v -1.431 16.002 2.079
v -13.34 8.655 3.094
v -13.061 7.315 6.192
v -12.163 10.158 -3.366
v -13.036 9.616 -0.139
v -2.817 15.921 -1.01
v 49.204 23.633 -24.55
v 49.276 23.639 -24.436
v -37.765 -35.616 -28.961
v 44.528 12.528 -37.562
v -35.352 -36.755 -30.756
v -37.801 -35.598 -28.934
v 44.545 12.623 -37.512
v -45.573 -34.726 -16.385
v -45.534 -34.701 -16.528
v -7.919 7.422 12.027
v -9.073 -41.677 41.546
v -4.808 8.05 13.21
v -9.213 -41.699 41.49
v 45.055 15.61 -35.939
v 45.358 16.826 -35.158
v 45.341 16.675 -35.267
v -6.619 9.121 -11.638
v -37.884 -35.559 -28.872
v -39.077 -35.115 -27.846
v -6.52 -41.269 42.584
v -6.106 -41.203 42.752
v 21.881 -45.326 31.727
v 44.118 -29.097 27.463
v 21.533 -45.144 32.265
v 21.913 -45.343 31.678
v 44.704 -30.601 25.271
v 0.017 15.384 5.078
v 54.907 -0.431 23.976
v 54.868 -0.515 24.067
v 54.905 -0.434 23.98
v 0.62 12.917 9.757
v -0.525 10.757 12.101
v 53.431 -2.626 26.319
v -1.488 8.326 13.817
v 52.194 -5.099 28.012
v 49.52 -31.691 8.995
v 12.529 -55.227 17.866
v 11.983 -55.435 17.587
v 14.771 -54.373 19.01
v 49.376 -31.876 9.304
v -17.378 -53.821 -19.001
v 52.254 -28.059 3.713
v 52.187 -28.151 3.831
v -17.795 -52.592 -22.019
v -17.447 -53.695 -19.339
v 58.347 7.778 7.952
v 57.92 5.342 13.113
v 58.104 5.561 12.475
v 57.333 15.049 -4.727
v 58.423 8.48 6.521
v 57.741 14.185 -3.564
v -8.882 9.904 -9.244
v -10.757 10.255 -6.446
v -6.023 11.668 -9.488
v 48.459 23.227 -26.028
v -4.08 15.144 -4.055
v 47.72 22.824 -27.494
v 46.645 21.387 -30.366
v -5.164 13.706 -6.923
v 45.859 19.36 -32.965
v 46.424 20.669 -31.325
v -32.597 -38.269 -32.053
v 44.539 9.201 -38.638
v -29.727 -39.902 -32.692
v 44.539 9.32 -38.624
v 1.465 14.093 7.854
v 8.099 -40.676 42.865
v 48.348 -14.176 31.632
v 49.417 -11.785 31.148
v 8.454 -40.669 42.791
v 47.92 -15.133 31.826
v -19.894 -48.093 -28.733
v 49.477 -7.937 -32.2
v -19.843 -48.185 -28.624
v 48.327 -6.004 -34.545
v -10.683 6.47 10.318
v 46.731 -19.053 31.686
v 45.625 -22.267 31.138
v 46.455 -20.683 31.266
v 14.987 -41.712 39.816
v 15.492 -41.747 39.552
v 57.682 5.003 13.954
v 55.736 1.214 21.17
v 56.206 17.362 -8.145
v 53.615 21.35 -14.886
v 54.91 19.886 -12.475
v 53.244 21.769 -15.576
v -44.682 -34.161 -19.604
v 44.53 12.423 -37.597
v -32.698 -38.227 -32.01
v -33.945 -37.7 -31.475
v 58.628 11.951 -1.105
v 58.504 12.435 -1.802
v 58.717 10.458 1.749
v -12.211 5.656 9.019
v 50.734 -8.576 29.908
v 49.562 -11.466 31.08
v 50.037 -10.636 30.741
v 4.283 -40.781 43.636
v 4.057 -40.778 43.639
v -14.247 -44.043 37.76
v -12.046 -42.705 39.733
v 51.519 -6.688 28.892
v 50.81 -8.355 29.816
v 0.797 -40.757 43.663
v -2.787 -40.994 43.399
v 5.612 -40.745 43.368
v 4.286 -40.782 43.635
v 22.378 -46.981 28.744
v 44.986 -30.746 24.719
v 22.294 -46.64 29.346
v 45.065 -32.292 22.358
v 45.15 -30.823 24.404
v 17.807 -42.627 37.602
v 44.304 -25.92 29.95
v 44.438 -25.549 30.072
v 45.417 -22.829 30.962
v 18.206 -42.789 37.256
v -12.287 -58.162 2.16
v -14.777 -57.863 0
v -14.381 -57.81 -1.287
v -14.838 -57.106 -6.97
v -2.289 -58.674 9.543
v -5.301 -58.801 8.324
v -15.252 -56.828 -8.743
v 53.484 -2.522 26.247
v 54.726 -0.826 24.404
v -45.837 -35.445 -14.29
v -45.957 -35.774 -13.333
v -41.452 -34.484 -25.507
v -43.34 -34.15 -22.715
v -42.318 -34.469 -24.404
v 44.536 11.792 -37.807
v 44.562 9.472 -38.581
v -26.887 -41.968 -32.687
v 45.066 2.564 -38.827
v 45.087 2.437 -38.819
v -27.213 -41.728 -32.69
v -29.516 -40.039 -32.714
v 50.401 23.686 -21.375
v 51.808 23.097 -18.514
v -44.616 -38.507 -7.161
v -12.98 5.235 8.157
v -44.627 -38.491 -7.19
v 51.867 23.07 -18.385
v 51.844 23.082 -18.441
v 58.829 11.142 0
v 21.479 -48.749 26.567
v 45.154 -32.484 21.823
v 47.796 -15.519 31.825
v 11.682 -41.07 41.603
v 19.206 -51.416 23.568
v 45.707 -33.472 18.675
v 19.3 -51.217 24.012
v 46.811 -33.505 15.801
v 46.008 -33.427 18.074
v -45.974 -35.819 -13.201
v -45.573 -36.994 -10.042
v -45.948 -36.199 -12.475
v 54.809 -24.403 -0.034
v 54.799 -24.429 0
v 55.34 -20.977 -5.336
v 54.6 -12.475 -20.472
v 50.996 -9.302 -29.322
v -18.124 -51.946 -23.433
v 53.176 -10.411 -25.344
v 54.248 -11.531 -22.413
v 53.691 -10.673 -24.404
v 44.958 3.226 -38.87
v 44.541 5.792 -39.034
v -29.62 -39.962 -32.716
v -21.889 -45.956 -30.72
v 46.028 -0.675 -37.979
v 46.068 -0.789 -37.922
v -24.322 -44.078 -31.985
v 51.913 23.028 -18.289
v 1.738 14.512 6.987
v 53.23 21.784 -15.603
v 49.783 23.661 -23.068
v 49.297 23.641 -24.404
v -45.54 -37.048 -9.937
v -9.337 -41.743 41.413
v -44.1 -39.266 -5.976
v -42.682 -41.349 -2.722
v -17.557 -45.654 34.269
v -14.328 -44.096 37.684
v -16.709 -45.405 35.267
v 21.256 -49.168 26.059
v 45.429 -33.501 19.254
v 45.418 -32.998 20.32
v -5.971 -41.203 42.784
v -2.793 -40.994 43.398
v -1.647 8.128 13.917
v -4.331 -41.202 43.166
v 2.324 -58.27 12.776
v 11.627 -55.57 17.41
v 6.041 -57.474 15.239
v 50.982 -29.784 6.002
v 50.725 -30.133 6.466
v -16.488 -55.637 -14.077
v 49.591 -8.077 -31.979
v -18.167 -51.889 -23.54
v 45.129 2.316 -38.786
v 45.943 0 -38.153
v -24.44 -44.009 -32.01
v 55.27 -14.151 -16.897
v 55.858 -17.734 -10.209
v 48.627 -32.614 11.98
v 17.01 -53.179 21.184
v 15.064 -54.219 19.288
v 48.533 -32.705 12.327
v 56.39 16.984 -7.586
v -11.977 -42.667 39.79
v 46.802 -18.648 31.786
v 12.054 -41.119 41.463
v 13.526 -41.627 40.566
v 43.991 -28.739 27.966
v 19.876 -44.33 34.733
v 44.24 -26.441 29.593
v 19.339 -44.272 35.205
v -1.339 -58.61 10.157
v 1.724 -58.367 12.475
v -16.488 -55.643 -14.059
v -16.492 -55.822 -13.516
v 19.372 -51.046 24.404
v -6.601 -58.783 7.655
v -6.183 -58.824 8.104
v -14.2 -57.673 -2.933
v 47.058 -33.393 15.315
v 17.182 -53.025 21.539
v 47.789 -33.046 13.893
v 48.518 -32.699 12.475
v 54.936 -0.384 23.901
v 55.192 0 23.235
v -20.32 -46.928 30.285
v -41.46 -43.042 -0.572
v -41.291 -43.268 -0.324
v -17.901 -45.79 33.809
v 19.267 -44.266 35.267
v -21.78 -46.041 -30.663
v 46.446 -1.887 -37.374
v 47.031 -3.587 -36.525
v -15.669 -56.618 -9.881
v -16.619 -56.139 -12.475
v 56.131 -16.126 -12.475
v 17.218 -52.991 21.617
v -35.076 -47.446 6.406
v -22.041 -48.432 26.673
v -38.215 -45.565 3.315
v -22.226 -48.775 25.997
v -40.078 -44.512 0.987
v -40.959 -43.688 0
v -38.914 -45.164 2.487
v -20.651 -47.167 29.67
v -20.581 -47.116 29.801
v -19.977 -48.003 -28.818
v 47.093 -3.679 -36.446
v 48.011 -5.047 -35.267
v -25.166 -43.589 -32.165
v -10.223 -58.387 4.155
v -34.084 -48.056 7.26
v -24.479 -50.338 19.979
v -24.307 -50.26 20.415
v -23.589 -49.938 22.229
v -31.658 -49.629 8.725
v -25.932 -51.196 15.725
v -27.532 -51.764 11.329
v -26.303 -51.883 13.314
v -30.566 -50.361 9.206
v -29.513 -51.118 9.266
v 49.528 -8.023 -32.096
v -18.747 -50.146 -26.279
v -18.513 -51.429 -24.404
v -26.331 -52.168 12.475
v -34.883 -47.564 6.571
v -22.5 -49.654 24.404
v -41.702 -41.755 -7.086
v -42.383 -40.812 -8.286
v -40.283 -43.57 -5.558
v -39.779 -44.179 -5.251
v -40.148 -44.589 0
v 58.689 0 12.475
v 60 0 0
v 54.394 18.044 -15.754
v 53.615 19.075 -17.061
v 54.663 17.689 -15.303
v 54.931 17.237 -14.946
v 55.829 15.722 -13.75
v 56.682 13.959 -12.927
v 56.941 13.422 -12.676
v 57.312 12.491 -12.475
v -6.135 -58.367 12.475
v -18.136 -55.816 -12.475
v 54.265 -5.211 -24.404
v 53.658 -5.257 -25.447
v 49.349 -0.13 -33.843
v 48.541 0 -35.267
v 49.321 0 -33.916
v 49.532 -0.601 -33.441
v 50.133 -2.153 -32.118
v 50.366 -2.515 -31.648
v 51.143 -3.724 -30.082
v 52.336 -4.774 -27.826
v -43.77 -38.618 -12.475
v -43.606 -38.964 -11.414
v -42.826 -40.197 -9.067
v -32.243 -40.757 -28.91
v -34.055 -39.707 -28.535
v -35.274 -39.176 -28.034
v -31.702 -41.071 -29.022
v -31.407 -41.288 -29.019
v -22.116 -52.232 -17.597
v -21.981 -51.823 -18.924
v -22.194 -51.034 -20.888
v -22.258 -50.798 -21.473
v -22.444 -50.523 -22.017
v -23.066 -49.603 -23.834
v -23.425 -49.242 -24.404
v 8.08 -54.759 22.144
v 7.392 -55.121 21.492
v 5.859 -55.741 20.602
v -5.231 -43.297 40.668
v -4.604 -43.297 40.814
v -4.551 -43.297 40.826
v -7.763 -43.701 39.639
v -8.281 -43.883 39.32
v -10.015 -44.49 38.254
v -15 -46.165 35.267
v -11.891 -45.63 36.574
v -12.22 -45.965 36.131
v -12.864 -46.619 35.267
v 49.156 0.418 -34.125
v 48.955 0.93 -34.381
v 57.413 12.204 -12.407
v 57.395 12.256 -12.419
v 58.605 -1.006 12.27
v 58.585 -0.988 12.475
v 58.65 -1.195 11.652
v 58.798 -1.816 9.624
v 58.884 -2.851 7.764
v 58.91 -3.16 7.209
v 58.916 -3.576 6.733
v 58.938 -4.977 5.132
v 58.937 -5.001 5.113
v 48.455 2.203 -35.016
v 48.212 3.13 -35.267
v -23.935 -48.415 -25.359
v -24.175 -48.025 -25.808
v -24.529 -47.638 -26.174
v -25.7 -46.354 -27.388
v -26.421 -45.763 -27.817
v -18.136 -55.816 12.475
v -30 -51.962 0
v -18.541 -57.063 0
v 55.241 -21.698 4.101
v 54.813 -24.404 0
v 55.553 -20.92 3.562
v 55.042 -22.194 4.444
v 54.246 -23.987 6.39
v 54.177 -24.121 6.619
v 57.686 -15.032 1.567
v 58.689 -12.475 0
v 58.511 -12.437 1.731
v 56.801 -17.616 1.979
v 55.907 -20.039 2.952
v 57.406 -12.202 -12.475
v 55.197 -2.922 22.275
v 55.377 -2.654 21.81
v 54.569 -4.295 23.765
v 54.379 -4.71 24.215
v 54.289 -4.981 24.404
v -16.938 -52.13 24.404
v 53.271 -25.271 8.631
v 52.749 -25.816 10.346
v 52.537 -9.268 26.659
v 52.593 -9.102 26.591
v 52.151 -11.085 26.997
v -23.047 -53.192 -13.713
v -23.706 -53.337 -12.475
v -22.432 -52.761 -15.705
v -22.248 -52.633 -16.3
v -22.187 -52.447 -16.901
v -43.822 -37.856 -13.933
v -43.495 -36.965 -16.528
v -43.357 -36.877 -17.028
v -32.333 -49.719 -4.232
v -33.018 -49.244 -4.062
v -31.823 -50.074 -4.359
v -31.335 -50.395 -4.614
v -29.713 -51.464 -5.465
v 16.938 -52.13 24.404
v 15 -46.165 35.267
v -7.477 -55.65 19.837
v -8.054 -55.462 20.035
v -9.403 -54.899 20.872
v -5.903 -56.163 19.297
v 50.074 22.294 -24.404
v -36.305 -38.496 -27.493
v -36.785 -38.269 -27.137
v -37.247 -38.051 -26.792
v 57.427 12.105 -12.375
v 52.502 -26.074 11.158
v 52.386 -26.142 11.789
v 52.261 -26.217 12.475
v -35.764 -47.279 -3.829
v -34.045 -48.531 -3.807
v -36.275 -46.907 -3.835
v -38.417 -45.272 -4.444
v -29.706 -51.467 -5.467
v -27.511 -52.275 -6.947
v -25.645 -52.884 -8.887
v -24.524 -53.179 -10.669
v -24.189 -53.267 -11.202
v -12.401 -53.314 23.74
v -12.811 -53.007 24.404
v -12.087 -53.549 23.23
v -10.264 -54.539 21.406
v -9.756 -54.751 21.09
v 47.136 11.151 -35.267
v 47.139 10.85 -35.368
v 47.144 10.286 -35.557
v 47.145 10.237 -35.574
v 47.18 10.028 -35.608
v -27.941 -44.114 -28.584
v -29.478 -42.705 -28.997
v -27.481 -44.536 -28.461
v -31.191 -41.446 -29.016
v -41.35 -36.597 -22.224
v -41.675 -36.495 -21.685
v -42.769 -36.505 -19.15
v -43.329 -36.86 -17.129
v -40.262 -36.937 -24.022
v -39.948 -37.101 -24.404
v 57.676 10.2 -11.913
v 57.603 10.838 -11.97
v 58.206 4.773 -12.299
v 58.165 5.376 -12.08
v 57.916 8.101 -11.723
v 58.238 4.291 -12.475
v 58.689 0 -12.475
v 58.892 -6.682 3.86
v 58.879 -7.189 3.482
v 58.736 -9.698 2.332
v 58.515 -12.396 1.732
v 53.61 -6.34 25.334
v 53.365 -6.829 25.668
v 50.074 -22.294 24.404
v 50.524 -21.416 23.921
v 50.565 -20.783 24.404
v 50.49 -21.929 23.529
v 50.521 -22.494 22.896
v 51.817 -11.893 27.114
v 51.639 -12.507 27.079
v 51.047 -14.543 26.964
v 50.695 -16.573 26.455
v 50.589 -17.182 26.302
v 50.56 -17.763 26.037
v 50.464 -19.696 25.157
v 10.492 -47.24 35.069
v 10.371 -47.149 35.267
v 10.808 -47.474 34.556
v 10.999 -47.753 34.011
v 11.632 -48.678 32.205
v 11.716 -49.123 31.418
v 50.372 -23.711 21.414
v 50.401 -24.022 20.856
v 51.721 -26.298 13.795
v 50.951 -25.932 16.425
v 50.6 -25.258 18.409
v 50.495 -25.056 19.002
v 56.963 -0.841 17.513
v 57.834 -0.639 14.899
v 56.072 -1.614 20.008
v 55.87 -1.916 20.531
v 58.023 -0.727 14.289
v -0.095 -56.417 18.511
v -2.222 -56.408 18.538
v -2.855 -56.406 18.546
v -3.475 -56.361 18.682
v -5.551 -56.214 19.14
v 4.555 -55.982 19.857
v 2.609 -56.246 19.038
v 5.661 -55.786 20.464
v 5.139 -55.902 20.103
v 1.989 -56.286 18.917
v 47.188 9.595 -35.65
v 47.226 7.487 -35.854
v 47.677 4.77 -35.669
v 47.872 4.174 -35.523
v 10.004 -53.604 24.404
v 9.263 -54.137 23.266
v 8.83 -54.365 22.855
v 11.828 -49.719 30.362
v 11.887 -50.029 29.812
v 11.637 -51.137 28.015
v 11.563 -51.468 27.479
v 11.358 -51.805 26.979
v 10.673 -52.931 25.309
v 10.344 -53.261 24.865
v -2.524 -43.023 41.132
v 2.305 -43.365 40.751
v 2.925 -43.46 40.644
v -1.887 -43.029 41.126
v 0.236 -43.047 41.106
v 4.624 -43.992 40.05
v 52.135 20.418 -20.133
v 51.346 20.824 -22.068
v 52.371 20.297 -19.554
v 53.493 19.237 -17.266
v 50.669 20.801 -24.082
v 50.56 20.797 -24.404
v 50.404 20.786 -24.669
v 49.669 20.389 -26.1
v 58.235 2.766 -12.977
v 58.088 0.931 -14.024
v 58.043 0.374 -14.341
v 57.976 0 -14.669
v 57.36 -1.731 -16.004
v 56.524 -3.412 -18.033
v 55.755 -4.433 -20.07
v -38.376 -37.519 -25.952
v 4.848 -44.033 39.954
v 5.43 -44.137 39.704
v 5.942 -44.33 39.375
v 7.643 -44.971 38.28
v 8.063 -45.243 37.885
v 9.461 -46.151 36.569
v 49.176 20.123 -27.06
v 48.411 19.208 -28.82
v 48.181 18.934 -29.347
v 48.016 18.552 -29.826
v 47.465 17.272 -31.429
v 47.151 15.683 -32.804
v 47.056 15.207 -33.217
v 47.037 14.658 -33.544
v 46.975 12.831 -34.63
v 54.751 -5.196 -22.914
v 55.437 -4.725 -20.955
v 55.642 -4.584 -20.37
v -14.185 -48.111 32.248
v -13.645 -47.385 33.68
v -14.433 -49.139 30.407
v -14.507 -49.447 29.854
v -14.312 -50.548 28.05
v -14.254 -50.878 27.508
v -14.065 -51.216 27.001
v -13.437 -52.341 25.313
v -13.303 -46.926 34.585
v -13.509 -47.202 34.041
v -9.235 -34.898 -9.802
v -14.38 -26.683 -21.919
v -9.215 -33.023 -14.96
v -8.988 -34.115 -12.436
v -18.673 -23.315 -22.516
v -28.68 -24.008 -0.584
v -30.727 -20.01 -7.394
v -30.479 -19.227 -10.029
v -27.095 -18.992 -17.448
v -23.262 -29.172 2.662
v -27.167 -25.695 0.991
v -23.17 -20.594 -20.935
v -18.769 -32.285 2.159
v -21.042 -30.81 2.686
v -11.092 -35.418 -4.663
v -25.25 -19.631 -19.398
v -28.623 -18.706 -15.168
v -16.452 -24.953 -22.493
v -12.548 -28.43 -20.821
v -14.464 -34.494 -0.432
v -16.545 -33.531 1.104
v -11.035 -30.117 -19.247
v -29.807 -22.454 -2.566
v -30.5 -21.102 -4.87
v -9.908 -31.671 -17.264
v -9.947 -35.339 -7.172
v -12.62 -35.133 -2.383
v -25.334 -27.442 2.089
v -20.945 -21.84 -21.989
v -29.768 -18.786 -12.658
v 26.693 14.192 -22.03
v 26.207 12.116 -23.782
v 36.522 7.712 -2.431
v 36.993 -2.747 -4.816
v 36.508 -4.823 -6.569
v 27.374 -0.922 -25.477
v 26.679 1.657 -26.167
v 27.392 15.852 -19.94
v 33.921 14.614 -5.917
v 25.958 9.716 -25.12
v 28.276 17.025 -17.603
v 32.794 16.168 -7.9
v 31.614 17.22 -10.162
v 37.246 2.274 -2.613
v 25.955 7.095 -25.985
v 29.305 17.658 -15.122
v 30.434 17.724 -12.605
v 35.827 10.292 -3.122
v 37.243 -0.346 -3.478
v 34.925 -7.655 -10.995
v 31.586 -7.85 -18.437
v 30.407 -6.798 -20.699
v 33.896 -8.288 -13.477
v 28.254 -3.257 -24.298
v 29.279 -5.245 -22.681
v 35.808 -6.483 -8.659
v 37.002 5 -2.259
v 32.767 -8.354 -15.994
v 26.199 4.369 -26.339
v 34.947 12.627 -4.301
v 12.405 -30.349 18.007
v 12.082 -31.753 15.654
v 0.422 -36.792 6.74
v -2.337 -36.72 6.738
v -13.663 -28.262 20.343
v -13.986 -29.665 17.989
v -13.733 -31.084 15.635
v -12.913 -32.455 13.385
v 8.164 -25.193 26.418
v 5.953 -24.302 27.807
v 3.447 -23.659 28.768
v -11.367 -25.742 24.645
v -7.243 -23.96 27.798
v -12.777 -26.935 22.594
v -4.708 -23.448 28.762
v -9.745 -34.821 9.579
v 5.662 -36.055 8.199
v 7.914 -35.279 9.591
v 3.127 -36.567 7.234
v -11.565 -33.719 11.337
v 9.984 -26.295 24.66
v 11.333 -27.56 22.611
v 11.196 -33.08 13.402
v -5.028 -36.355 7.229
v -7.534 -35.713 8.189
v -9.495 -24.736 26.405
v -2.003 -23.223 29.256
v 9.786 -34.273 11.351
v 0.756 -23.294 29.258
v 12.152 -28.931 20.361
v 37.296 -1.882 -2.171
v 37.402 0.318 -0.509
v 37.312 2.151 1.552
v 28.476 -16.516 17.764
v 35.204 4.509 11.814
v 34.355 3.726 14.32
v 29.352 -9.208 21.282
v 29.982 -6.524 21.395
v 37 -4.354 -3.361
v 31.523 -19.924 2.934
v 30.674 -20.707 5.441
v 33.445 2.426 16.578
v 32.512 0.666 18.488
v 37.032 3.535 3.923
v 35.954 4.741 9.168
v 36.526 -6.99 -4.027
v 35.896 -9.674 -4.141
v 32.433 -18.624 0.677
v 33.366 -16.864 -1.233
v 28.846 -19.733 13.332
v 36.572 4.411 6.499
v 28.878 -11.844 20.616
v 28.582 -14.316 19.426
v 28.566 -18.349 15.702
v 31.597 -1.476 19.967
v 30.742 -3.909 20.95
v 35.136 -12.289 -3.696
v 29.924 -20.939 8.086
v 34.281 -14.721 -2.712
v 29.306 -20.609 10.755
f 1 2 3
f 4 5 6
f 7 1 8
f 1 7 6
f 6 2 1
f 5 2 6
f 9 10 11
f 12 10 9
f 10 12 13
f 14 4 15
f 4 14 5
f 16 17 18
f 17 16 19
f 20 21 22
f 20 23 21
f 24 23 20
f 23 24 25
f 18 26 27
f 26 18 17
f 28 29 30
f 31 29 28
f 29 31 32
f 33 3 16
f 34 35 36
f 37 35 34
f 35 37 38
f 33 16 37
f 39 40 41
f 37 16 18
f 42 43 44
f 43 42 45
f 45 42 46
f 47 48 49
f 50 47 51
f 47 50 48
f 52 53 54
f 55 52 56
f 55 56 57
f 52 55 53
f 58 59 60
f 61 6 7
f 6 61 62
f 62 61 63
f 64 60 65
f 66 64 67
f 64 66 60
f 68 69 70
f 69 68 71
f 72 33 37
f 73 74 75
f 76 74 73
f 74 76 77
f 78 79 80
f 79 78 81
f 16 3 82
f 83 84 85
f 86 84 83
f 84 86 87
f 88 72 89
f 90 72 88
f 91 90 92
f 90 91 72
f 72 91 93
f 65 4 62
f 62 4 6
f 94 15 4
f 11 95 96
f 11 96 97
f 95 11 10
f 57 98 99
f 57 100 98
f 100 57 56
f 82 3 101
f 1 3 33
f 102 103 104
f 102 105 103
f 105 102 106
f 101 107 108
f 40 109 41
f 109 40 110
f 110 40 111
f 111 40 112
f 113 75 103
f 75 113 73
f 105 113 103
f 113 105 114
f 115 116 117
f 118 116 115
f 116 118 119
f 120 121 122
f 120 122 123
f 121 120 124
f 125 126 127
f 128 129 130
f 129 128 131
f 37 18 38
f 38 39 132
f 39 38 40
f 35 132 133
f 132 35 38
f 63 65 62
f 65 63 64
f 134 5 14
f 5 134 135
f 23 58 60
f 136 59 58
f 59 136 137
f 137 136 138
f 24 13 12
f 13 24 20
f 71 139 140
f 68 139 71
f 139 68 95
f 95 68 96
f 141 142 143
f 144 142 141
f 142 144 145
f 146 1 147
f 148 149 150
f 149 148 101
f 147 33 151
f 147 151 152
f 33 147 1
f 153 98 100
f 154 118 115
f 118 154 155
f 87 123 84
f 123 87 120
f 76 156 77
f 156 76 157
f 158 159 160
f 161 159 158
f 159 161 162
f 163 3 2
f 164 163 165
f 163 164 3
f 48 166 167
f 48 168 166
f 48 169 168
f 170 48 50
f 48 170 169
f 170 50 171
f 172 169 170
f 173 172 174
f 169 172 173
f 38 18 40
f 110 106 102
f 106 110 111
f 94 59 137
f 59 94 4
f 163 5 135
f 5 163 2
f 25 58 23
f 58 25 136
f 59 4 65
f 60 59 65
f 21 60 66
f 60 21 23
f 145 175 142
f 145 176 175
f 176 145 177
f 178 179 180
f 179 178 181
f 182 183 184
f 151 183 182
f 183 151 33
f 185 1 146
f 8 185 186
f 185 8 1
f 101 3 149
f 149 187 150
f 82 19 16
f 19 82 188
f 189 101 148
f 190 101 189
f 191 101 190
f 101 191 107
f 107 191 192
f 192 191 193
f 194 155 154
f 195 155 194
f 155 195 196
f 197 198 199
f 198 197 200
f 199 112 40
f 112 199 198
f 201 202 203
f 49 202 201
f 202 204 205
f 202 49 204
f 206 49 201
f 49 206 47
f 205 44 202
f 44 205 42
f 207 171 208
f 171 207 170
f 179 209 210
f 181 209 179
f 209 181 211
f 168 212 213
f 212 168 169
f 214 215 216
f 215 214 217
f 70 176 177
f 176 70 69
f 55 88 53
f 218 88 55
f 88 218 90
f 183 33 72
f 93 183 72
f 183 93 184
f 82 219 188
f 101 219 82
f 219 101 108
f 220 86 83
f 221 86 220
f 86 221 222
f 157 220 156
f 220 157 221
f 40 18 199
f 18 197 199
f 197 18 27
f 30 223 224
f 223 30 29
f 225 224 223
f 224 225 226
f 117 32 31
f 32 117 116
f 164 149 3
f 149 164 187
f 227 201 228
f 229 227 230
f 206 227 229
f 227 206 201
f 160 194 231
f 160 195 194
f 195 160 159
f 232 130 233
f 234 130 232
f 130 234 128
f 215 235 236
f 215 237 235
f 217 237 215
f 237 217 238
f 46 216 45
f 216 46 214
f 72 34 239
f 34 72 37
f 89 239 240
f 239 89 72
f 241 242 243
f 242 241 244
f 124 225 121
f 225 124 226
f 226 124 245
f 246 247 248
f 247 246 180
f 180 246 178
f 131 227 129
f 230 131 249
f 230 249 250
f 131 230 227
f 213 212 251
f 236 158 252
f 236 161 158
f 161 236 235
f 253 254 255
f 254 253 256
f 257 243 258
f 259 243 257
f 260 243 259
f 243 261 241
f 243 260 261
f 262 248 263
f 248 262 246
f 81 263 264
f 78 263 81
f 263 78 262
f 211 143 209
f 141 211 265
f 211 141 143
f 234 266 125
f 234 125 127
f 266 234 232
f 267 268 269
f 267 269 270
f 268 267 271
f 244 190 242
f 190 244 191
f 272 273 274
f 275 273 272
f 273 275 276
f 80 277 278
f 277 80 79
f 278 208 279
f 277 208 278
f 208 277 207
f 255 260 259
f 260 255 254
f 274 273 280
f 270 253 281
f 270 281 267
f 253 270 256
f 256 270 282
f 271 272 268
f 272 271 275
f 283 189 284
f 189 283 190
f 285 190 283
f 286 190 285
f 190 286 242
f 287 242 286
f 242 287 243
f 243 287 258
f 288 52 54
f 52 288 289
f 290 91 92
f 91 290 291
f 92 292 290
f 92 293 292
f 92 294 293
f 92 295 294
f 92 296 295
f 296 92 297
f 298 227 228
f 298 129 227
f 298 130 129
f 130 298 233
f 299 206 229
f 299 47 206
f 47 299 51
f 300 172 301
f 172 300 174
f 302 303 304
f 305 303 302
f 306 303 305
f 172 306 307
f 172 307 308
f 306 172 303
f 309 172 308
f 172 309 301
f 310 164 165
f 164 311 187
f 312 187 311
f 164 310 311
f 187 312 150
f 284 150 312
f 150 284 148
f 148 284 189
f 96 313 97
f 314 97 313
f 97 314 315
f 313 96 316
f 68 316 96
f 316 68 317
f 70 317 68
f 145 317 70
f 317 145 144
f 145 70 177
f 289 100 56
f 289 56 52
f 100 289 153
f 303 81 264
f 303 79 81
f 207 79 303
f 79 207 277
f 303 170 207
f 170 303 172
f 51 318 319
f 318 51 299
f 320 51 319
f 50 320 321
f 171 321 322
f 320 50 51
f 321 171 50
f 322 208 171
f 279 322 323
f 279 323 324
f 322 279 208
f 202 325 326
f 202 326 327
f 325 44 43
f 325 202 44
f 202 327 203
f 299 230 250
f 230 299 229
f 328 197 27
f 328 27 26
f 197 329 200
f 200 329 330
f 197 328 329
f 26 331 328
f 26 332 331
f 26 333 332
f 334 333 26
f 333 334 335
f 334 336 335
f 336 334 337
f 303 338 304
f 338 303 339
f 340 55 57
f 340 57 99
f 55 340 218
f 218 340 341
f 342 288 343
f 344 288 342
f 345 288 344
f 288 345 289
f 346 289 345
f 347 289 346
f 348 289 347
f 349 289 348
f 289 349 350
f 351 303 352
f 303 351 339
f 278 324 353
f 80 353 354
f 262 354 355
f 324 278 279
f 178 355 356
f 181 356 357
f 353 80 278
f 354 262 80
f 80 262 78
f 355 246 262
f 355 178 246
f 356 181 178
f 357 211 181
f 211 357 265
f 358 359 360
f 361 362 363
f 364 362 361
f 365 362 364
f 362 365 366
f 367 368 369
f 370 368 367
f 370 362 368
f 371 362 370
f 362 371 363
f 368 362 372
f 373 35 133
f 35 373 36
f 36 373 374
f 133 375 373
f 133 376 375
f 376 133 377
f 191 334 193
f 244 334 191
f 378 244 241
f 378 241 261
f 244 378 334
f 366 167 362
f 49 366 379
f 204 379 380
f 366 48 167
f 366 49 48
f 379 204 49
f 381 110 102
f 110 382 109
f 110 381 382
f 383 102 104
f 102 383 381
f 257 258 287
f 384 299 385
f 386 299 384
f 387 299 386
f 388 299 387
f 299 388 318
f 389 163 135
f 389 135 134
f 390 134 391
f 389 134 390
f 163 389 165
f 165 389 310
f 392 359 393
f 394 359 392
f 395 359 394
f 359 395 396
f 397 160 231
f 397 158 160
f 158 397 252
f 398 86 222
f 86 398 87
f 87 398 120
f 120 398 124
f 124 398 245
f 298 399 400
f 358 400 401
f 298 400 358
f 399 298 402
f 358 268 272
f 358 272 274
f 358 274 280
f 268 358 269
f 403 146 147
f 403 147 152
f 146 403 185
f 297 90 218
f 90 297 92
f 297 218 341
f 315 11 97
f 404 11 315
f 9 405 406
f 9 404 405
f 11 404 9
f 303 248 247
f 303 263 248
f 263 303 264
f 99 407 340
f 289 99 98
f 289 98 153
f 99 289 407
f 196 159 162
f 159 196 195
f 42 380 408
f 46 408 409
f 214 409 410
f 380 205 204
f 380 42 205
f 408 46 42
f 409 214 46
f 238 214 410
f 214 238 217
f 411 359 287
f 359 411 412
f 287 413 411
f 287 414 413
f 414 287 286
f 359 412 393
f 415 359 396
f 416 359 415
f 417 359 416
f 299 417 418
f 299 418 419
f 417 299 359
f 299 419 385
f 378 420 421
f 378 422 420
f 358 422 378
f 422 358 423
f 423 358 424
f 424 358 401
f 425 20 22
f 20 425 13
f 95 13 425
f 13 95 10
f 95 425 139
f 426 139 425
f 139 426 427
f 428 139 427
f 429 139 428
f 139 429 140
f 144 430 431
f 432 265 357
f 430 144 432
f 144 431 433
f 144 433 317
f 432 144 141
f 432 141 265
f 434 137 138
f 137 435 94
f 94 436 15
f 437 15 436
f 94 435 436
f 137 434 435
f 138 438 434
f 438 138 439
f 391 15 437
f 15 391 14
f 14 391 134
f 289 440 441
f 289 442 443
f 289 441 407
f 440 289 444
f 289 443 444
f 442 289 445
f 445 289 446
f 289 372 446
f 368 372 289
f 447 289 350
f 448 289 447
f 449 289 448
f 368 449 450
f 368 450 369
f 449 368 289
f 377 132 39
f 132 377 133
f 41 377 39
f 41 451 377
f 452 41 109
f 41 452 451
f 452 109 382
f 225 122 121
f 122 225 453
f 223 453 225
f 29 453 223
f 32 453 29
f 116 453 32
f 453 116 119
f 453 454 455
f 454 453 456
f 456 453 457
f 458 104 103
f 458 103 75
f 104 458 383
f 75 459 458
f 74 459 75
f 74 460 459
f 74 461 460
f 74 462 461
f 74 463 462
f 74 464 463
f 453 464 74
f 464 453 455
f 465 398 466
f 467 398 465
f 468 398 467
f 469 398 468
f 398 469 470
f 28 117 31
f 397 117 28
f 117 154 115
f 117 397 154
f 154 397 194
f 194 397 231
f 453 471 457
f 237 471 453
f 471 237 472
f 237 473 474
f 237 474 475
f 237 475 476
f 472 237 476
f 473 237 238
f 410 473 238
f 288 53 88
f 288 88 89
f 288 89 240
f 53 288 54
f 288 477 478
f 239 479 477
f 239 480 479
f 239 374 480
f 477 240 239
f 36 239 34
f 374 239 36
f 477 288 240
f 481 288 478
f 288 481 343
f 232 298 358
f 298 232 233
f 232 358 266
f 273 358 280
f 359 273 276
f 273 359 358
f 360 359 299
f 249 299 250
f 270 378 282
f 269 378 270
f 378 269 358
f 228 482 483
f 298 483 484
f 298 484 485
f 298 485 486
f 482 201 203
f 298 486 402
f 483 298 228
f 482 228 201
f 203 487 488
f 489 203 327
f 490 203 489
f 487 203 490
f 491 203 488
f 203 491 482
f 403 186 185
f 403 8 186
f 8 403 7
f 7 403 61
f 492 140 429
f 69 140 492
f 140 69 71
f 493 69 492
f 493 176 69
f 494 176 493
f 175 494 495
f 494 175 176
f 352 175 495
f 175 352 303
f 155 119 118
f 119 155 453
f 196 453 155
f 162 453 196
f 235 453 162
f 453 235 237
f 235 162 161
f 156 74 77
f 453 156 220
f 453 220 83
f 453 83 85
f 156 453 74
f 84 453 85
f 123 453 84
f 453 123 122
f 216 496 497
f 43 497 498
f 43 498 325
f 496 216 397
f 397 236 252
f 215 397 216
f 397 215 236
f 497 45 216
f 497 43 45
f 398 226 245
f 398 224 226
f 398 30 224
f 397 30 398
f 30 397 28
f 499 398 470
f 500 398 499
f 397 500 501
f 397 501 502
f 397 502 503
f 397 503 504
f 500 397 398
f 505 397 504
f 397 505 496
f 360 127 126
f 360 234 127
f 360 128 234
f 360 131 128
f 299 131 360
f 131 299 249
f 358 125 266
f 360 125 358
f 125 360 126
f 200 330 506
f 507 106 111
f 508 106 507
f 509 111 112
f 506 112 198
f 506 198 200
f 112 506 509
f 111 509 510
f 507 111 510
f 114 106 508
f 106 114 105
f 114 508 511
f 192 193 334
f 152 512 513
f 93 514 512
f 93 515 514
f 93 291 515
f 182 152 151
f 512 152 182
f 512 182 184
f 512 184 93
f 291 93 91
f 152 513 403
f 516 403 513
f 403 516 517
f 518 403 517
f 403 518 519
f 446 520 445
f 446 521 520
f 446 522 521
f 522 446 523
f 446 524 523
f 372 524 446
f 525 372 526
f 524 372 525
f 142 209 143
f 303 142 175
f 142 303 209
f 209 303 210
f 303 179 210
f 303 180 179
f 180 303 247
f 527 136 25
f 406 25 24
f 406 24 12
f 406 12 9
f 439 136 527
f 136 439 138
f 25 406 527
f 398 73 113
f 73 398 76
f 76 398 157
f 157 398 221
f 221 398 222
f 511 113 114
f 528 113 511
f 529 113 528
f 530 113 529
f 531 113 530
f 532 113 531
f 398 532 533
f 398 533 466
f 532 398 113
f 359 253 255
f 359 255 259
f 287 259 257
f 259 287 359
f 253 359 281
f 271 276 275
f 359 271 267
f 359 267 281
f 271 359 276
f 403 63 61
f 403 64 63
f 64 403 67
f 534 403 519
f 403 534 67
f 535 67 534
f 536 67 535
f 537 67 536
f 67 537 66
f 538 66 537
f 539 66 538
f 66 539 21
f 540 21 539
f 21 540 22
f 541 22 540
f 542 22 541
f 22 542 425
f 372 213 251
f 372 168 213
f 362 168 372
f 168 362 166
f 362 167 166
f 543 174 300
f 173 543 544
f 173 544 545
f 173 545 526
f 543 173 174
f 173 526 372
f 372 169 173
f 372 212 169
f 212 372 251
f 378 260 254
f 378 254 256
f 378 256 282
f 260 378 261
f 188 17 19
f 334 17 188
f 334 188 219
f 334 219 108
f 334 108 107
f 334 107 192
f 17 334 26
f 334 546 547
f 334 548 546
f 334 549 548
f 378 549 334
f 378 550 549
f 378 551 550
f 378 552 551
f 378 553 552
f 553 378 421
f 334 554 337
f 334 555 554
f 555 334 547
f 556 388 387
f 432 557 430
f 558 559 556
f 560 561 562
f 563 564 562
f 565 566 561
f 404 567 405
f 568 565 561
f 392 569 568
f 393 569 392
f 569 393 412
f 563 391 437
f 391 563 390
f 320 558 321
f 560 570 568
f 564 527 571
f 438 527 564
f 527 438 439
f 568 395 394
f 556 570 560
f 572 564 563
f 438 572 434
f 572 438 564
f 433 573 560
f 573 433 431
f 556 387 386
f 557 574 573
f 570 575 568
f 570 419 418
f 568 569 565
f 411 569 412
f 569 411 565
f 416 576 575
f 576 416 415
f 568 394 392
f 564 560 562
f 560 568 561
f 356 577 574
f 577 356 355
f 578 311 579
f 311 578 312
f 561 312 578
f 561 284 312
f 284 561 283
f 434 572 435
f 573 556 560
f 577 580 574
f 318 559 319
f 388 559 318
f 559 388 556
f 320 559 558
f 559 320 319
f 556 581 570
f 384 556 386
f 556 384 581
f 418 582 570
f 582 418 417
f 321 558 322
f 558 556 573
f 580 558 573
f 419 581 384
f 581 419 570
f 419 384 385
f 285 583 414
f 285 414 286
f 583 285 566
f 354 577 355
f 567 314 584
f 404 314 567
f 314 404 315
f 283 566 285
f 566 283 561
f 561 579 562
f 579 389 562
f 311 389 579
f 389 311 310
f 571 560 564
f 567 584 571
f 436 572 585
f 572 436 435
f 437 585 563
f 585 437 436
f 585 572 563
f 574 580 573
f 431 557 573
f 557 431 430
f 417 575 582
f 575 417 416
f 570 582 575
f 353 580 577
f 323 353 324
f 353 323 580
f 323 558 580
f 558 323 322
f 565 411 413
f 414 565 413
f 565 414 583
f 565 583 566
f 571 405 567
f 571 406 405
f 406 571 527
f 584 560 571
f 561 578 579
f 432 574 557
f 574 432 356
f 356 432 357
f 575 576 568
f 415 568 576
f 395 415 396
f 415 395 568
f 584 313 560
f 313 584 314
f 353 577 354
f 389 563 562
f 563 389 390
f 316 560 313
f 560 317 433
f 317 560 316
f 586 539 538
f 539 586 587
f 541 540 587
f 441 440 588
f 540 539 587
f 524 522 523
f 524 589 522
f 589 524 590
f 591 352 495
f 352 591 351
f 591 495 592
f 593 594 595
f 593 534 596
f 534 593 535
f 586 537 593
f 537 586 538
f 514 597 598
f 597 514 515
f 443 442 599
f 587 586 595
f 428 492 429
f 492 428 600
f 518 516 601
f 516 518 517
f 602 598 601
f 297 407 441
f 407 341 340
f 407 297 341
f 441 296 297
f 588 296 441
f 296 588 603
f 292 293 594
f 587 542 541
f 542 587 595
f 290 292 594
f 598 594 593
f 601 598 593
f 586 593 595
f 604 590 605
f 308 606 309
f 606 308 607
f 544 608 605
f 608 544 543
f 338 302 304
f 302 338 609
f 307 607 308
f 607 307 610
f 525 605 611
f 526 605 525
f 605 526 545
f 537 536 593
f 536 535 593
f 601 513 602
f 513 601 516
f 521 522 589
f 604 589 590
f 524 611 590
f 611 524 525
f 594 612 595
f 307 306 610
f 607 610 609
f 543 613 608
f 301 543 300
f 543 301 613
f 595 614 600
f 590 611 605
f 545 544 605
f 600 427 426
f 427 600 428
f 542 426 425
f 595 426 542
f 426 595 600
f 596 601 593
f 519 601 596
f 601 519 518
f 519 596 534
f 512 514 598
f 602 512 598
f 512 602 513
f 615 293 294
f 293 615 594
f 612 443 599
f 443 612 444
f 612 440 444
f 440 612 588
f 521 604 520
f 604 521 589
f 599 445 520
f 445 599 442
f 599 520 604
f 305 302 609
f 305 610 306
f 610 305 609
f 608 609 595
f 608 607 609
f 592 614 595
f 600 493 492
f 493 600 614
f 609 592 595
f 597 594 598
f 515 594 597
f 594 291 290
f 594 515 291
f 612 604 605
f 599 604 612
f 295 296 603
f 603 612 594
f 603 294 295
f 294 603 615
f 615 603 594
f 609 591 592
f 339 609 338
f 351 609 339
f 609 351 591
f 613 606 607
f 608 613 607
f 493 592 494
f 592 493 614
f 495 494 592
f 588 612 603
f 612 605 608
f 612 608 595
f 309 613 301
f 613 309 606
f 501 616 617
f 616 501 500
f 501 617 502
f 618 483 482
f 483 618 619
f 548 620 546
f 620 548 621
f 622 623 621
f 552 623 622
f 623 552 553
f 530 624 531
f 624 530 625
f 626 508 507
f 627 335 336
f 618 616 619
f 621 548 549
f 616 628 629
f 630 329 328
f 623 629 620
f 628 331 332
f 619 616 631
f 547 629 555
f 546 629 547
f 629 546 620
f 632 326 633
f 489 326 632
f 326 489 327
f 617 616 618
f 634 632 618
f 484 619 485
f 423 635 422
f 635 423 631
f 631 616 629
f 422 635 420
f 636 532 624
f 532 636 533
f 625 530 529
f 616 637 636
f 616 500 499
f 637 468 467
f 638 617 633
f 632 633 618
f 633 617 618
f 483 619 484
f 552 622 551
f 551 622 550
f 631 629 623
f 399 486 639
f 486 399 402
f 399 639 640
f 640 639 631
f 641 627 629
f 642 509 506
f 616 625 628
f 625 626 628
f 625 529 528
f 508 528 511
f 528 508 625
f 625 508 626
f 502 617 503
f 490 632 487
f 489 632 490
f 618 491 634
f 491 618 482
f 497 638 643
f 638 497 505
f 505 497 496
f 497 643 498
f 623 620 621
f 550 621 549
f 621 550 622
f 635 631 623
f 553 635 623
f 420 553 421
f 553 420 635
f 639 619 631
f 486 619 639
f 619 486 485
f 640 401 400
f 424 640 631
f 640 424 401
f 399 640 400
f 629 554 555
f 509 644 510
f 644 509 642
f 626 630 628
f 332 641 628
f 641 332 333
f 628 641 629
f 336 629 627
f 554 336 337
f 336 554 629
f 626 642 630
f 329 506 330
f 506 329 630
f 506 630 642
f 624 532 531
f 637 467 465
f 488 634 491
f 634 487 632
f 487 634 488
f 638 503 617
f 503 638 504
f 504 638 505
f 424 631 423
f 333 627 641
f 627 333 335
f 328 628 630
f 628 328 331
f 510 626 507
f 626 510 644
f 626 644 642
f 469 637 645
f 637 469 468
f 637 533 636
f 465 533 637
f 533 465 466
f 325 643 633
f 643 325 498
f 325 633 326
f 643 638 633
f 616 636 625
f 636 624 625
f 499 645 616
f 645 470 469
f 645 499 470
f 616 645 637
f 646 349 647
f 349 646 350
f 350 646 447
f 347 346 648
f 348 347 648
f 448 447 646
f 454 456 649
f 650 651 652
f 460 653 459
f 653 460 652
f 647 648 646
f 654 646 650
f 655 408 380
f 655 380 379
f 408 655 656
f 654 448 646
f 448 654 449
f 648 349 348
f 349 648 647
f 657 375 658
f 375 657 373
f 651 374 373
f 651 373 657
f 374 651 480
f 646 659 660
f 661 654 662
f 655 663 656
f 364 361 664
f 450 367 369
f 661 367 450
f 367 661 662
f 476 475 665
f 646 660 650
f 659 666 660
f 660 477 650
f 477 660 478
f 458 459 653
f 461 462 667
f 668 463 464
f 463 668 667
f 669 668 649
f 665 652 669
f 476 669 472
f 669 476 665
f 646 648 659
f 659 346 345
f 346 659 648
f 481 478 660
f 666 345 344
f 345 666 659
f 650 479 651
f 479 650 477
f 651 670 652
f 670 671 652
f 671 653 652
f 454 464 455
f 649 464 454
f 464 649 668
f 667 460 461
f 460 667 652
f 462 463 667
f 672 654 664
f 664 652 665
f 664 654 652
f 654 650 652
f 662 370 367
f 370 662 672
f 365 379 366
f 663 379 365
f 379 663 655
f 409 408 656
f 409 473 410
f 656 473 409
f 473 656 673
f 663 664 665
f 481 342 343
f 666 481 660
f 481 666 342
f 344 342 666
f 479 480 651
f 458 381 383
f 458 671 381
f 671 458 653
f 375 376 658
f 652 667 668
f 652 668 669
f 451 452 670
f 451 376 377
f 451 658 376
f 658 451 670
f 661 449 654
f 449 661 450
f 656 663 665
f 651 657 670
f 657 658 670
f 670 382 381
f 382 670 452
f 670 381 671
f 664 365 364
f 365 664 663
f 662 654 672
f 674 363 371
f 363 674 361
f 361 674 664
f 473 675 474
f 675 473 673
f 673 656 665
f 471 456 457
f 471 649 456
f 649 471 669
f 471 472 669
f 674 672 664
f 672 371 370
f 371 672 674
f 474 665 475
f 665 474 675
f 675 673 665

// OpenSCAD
difference() {
	intersection() {
		hull() {
			rotate(a = -44.0760747966, v = [-0.5629948017, -0.4085512351, 0.0000000000]) {
				rotate(a = -90.0000000000, v = [-0.8660254038, 0.5000000000, 0.0000000000]) {
					cylinder(h = 60, r = 16.2000000000);
				}
			}
			rotate(a = -44.0760747966, v = [-0.5629948017, -0.4085512351, 0.0000000000]) {
				rotate(a = -90.0000000000, v = [-0.0000000000, -1.0000000000, 0.0000000000]) {
					cylinder(h = 60, r = 16.2000000000);
				}
			}
			rotate(a = -44.0760747966, v = [-0.5629948017, -0.4085512351, 0.0000000000]) {
				rotate(a = -32.5529951665, v = [-0.4127226266, 0.3452383875, 0.0000000000]) {
					cylinder(h = 60, r = 16.2000000000);
				}
			}
			rotate(a = -44.0760747966, v = [-0.5629948017, -0.4085512351, 0.0000000000]) {
				rotate(a = -46.2229214243, v = [0.0760264543, -0.7180233296, 0.0000000000]) {
					cylinder(h = 60, r = 16.2000000000);
				}
			}
		}
		sphere(r = 60);
	}
	union() {
		rotate(a = -44.0760747966, v = [-0.5629948017, -0.4085512351, 0.0000000000]) {
			rotate(a = -90.0000000000, v = [-0.8660254038, 0.5000000000, 0.0000000000]) {
				translate(v = [0, 0, 35]) {
					cylinder(h = 100, r = 13.2000000000);
				}
			}
		}
		rotate(a = -44.0760747966, v = [-0.5629948017, -0.4085512351, 0.0000000000]) {
			rotate(a = -90.0000000000, v = [-0.0000000000, -1.0000000000, 0.0000000000]) {
				translate(v = [0, 0, 35]) {
					cylinder(h = 100, r = 13.2000000000);
				}
			}
		}
		rotate(a = -44.0760747966, v = [-0.5629948017, -0.4085512351, 0.0000000000]) {
			rotate(a = -32.5529951665, v = [-0.4127226266, 0.3452383875, 0.0000000000]) {
				translate(v = [0, 0, 35]) {
					cylinder(h = 100, r = 13.2000000000);
				}
			}
		}
		rotate(a = -44.0760747966, v = [-0.5629948017, -0.4085512351, 0.0000000000]) {
			rotate(a = -46.2229214243, v = [0.0760264543, -0.7180233296, 0.0000000000]) {
				translate(v = [0, 0, 35]) {
					cylinder(h = 100, r = 13.2000000000);
				}
			}
		}
	}
}
